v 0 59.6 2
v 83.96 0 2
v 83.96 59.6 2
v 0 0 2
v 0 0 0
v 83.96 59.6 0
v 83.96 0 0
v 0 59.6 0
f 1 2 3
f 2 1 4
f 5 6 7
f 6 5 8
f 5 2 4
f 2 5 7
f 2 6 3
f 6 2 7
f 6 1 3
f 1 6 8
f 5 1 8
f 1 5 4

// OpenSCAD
// Enclosure for the Olimex AX0-OLinuXino-LIME board
// License GNU AFFERO GENERAL PUBLIC LICENSE v3+
// Copyright 2014 Christian Ege 


clearance=0.8;
// minimum wall width 
wall_width=1.6; 
layer_height=0.2;

lime_board_x = 83.96;
lime_board_y = 59.6;
lime_board_z = 2.00;

lime_notch_diameter = 0.0;
lime_notches = [ 
				[ 21.55, 0.0 ],
				[43.01, 0.0 ],
				[ 21.55, 0.0 ],
				[43.01, 0.0 ]
];

lime_drill_holes = [
						[0.0,	15.80],
						[0.0, 55.18]
];

module lime_pcb() {
	color("red") {
		cube([lime_board_x,lime_board_y,lime_board_z]);
	}
}

lime_pcb();
